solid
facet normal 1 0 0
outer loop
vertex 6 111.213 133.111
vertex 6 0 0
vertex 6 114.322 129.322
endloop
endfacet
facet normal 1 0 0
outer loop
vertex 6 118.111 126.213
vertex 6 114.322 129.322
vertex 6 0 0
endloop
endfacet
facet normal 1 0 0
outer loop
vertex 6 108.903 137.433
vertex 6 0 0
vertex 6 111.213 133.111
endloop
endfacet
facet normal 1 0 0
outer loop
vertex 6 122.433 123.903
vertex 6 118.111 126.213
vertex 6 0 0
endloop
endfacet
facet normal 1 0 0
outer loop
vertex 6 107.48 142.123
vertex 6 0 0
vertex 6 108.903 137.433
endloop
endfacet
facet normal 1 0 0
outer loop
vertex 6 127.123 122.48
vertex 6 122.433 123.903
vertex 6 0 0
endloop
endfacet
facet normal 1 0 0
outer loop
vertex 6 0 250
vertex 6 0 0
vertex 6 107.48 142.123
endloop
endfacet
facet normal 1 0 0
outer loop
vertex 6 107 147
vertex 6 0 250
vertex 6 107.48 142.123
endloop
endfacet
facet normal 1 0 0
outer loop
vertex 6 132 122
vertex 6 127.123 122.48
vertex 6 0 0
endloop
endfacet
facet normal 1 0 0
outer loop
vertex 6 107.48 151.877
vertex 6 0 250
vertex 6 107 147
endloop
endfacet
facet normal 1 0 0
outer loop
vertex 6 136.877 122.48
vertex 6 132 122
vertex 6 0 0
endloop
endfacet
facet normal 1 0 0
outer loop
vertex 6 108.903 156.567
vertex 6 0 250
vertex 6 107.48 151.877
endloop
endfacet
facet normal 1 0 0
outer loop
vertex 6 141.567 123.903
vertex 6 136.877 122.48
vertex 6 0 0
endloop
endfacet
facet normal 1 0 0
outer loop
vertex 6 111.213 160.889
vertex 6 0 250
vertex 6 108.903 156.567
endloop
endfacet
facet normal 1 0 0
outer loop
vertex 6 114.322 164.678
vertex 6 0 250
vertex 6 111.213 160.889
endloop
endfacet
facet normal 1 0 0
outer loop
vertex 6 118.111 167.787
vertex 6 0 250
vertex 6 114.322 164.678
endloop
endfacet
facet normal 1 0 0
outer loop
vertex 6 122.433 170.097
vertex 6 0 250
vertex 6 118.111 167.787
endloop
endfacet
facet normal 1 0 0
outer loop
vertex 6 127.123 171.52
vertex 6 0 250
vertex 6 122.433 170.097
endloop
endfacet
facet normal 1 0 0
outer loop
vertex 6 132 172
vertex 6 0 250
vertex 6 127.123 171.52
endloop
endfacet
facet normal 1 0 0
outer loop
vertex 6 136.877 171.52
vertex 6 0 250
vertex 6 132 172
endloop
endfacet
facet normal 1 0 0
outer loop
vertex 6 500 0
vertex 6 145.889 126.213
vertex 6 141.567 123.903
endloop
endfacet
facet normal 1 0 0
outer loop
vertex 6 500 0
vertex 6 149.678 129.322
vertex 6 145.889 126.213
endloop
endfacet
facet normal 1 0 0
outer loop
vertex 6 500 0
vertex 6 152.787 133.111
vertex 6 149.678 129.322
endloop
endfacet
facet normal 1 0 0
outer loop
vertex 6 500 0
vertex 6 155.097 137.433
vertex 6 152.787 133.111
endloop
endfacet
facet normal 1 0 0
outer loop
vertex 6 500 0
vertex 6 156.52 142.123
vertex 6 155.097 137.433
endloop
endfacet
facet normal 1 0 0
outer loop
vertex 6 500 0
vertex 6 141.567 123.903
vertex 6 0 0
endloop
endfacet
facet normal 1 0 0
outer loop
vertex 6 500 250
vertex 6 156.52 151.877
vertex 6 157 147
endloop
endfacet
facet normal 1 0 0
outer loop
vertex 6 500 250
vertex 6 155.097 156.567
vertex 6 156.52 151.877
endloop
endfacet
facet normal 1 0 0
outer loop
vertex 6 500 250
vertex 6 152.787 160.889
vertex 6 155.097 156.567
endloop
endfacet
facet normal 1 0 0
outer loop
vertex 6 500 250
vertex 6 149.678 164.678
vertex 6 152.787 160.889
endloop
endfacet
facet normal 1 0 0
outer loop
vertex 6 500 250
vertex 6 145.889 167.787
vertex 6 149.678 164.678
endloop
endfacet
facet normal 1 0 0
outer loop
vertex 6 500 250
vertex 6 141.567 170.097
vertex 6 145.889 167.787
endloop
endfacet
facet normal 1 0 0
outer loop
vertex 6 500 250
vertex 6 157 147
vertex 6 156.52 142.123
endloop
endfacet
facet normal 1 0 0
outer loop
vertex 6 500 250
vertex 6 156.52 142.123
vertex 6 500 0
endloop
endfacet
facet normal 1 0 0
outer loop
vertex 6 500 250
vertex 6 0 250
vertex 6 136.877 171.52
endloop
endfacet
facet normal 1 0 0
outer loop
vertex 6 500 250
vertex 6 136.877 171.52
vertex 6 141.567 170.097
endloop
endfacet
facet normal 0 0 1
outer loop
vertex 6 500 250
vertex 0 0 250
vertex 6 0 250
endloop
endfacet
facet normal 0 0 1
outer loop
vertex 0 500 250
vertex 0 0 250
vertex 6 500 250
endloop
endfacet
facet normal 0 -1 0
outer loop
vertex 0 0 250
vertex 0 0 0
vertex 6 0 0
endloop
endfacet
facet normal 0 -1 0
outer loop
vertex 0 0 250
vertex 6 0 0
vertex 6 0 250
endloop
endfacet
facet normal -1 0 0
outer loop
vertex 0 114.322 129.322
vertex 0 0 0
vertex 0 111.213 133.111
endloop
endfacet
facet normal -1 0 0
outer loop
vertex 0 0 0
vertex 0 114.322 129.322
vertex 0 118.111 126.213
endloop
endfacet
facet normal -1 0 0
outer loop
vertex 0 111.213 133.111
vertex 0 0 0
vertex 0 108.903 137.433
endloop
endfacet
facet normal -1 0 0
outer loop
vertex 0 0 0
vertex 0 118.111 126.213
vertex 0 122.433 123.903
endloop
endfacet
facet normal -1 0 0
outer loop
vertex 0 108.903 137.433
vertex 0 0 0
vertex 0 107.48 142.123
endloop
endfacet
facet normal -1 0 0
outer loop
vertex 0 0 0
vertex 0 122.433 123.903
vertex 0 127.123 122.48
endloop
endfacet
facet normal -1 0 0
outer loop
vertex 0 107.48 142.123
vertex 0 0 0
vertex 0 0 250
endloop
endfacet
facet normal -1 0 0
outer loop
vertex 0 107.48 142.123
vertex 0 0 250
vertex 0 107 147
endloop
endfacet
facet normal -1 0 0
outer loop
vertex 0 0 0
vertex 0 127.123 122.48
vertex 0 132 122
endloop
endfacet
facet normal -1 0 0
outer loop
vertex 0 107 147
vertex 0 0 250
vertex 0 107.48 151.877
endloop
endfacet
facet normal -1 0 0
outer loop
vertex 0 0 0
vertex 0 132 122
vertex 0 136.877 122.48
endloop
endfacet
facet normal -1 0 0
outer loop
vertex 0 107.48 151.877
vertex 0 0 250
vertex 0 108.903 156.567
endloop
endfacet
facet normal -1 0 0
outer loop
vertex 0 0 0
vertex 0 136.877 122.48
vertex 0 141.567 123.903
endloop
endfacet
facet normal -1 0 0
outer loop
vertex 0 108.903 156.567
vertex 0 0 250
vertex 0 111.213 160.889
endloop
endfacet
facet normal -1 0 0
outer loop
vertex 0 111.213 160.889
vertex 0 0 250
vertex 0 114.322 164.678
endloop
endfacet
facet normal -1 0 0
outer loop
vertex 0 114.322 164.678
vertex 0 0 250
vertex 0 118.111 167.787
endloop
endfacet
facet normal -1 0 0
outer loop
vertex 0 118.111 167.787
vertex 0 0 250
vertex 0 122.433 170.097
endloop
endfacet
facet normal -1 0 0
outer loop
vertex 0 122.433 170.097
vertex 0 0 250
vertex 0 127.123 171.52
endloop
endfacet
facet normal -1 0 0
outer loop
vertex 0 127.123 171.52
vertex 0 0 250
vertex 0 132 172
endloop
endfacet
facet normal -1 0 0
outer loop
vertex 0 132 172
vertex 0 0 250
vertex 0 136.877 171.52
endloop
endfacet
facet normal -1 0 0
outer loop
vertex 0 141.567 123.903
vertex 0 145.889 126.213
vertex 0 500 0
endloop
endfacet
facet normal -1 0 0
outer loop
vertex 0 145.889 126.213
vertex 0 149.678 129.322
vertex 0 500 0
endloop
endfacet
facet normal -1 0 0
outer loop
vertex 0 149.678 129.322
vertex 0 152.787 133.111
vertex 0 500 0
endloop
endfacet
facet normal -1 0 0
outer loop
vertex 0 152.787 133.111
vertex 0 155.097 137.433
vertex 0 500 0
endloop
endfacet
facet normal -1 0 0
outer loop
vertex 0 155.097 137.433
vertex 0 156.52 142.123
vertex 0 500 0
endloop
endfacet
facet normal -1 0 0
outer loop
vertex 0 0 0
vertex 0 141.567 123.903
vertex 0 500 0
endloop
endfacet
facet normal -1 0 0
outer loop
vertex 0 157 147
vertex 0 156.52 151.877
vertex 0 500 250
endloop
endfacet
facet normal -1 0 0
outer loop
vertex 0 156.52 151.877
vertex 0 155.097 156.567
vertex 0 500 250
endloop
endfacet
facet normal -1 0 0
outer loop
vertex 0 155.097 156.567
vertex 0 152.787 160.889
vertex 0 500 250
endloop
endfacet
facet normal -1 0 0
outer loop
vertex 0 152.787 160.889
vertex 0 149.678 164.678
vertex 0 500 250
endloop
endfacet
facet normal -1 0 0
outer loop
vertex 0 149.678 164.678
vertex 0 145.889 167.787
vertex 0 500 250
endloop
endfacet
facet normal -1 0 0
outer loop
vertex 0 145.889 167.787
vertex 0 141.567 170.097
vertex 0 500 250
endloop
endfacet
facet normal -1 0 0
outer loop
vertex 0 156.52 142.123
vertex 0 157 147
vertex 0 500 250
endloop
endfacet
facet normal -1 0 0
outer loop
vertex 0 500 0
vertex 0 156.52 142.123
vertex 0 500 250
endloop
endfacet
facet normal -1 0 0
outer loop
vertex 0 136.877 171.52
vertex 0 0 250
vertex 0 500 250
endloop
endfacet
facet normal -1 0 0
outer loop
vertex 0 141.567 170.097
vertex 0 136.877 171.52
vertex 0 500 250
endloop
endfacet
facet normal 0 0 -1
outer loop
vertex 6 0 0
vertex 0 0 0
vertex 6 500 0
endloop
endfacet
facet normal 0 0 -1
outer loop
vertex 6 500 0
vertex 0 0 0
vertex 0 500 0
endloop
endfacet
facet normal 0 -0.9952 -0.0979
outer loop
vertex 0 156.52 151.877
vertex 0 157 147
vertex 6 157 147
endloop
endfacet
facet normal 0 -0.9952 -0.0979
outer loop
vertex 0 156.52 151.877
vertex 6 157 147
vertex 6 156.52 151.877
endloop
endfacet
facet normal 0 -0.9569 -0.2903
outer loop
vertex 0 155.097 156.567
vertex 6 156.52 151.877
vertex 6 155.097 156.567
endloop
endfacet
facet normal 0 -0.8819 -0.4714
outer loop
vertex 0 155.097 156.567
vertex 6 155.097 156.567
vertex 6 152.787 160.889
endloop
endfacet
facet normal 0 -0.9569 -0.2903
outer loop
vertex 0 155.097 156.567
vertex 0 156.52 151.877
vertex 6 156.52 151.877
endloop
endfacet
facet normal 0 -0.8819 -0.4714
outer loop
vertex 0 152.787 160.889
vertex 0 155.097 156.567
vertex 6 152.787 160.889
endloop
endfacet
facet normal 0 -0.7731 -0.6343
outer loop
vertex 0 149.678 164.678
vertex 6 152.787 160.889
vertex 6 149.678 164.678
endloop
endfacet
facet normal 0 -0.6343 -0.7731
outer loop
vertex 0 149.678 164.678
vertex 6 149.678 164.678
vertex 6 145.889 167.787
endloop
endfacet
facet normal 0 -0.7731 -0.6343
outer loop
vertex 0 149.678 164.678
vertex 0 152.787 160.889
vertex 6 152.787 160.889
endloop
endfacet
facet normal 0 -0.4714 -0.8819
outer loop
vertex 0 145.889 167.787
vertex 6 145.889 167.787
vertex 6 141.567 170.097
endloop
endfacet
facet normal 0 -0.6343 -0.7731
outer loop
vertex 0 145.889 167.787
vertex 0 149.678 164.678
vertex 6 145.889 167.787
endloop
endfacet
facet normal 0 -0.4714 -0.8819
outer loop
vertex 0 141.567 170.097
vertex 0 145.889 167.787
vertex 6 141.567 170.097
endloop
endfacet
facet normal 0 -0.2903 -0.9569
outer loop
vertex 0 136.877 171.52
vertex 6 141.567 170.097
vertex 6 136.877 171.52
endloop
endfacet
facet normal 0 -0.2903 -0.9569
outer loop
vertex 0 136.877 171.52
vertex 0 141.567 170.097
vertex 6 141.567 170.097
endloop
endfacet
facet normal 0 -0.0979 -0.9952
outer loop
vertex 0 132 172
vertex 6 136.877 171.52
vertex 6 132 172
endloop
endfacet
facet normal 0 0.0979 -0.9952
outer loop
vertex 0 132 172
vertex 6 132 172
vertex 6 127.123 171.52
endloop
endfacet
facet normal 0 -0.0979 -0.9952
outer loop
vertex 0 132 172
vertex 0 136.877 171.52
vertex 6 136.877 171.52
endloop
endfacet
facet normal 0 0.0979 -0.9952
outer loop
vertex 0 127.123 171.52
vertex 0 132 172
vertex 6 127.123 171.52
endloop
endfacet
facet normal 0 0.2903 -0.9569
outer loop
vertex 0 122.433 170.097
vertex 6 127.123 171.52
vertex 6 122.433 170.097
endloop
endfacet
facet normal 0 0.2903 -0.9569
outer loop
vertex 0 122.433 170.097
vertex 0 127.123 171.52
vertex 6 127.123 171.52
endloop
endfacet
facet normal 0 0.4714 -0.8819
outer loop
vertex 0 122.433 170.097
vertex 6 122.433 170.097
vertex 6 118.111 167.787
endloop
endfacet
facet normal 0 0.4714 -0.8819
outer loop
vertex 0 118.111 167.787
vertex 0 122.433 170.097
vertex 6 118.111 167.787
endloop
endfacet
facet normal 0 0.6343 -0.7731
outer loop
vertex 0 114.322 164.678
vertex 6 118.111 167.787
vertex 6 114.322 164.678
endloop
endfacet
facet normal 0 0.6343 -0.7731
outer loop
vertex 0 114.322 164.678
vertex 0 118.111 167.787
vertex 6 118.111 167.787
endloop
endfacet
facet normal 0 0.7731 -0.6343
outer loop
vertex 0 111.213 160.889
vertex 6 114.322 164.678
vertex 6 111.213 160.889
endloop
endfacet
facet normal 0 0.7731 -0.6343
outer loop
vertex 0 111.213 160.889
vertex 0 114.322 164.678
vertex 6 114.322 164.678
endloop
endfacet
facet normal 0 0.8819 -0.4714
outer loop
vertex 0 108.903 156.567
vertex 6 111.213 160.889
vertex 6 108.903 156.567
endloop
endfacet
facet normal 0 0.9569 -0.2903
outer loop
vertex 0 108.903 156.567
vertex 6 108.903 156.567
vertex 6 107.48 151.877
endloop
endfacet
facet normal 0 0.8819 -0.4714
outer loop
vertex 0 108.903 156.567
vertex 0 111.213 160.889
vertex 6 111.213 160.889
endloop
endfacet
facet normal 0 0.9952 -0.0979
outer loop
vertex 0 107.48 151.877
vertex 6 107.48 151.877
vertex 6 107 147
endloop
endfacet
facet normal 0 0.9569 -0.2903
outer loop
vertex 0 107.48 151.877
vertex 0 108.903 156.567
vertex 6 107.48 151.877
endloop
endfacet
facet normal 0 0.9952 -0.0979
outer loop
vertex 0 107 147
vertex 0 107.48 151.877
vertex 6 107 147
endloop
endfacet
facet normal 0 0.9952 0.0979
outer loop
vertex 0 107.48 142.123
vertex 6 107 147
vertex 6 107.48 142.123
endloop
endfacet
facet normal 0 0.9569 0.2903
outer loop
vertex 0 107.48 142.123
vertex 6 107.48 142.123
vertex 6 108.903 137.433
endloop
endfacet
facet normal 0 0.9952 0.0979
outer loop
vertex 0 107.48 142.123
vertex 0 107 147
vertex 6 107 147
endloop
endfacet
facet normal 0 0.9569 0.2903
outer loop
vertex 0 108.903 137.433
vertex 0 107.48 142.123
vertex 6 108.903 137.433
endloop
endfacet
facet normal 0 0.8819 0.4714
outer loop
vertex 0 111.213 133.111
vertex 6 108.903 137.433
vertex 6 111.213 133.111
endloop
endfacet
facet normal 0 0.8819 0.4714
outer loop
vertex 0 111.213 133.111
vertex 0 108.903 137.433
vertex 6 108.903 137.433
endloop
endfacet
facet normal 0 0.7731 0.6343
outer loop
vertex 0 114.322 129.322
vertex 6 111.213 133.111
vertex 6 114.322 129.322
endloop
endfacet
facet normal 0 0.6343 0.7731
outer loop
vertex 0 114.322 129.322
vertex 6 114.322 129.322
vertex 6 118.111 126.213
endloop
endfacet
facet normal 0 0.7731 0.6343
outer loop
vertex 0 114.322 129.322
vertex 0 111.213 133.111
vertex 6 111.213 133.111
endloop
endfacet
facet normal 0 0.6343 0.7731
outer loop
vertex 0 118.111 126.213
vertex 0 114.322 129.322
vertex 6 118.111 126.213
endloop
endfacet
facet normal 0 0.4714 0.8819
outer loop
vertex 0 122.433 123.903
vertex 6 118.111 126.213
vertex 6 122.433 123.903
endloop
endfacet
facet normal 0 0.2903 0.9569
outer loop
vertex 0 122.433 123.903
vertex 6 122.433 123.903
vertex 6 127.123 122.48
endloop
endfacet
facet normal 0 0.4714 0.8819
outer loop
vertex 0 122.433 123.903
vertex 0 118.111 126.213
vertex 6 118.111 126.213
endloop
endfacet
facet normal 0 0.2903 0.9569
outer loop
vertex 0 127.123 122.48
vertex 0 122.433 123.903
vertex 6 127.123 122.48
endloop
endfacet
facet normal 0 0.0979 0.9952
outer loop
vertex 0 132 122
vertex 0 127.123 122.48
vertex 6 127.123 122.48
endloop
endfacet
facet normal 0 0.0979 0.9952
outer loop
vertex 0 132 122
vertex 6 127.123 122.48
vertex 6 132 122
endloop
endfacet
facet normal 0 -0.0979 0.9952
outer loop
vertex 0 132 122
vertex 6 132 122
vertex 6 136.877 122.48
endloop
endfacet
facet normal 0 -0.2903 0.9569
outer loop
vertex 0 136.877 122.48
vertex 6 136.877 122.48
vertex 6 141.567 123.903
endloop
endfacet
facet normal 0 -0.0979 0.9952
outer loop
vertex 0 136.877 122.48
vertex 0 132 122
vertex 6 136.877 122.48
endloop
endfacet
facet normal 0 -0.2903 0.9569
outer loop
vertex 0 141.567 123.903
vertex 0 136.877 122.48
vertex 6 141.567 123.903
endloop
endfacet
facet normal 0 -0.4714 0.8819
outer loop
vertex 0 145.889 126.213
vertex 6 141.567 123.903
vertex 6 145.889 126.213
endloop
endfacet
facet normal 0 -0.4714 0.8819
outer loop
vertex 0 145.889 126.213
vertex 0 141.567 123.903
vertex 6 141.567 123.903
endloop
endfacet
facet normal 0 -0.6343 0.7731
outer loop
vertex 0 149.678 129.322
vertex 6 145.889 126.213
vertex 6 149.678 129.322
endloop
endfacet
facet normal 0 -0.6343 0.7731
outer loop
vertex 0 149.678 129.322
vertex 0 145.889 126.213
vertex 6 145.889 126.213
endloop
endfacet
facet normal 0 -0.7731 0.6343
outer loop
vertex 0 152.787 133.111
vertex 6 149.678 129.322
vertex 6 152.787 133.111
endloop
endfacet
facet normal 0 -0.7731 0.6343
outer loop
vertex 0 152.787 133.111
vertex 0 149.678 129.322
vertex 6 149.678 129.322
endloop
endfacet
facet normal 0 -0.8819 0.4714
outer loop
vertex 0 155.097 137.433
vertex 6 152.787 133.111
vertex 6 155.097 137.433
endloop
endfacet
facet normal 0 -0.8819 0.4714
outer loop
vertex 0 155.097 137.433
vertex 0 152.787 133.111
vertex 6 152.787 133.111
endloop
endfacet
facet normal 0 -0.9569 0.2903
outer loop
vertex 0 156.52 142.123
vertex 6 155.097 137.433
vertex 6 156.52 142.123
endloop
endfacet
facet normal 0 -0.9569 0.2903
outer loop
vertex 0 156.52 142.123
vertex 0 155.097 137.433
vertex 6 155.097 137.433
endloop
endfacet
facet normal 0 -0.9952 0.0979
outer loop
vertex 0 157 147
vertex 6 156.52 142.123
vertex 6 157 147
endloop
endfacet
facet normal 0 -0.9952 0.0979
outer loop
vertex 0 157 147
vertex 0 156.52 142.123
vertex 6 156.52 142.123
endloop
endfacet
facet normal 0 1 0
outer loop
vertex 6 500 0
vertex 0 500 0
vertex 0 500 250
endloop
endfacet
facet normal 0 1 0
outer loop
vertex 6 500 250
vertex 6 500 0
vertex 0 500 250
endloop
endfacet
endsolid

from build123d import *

# Parameters (mm, degrees)
SKETCH_W  = 500
SKETCH_H  = 250
SKETCH_R  = 25
PAD_DEPTH = 6


with BuildPart() as part:
    # Sketch → Pad (new body)
    with BuildSketch(Plane.YZ):
        with Locations((250, 125)):
            Rectangle(SKETCH_W, SKETCH_H)
        with Locations((132, 147)):
            Circle(SKETCH_R, mode=Mode.SUBTRACT)
    extrude(amount=PAD_DEPTH)


solid = part.part
